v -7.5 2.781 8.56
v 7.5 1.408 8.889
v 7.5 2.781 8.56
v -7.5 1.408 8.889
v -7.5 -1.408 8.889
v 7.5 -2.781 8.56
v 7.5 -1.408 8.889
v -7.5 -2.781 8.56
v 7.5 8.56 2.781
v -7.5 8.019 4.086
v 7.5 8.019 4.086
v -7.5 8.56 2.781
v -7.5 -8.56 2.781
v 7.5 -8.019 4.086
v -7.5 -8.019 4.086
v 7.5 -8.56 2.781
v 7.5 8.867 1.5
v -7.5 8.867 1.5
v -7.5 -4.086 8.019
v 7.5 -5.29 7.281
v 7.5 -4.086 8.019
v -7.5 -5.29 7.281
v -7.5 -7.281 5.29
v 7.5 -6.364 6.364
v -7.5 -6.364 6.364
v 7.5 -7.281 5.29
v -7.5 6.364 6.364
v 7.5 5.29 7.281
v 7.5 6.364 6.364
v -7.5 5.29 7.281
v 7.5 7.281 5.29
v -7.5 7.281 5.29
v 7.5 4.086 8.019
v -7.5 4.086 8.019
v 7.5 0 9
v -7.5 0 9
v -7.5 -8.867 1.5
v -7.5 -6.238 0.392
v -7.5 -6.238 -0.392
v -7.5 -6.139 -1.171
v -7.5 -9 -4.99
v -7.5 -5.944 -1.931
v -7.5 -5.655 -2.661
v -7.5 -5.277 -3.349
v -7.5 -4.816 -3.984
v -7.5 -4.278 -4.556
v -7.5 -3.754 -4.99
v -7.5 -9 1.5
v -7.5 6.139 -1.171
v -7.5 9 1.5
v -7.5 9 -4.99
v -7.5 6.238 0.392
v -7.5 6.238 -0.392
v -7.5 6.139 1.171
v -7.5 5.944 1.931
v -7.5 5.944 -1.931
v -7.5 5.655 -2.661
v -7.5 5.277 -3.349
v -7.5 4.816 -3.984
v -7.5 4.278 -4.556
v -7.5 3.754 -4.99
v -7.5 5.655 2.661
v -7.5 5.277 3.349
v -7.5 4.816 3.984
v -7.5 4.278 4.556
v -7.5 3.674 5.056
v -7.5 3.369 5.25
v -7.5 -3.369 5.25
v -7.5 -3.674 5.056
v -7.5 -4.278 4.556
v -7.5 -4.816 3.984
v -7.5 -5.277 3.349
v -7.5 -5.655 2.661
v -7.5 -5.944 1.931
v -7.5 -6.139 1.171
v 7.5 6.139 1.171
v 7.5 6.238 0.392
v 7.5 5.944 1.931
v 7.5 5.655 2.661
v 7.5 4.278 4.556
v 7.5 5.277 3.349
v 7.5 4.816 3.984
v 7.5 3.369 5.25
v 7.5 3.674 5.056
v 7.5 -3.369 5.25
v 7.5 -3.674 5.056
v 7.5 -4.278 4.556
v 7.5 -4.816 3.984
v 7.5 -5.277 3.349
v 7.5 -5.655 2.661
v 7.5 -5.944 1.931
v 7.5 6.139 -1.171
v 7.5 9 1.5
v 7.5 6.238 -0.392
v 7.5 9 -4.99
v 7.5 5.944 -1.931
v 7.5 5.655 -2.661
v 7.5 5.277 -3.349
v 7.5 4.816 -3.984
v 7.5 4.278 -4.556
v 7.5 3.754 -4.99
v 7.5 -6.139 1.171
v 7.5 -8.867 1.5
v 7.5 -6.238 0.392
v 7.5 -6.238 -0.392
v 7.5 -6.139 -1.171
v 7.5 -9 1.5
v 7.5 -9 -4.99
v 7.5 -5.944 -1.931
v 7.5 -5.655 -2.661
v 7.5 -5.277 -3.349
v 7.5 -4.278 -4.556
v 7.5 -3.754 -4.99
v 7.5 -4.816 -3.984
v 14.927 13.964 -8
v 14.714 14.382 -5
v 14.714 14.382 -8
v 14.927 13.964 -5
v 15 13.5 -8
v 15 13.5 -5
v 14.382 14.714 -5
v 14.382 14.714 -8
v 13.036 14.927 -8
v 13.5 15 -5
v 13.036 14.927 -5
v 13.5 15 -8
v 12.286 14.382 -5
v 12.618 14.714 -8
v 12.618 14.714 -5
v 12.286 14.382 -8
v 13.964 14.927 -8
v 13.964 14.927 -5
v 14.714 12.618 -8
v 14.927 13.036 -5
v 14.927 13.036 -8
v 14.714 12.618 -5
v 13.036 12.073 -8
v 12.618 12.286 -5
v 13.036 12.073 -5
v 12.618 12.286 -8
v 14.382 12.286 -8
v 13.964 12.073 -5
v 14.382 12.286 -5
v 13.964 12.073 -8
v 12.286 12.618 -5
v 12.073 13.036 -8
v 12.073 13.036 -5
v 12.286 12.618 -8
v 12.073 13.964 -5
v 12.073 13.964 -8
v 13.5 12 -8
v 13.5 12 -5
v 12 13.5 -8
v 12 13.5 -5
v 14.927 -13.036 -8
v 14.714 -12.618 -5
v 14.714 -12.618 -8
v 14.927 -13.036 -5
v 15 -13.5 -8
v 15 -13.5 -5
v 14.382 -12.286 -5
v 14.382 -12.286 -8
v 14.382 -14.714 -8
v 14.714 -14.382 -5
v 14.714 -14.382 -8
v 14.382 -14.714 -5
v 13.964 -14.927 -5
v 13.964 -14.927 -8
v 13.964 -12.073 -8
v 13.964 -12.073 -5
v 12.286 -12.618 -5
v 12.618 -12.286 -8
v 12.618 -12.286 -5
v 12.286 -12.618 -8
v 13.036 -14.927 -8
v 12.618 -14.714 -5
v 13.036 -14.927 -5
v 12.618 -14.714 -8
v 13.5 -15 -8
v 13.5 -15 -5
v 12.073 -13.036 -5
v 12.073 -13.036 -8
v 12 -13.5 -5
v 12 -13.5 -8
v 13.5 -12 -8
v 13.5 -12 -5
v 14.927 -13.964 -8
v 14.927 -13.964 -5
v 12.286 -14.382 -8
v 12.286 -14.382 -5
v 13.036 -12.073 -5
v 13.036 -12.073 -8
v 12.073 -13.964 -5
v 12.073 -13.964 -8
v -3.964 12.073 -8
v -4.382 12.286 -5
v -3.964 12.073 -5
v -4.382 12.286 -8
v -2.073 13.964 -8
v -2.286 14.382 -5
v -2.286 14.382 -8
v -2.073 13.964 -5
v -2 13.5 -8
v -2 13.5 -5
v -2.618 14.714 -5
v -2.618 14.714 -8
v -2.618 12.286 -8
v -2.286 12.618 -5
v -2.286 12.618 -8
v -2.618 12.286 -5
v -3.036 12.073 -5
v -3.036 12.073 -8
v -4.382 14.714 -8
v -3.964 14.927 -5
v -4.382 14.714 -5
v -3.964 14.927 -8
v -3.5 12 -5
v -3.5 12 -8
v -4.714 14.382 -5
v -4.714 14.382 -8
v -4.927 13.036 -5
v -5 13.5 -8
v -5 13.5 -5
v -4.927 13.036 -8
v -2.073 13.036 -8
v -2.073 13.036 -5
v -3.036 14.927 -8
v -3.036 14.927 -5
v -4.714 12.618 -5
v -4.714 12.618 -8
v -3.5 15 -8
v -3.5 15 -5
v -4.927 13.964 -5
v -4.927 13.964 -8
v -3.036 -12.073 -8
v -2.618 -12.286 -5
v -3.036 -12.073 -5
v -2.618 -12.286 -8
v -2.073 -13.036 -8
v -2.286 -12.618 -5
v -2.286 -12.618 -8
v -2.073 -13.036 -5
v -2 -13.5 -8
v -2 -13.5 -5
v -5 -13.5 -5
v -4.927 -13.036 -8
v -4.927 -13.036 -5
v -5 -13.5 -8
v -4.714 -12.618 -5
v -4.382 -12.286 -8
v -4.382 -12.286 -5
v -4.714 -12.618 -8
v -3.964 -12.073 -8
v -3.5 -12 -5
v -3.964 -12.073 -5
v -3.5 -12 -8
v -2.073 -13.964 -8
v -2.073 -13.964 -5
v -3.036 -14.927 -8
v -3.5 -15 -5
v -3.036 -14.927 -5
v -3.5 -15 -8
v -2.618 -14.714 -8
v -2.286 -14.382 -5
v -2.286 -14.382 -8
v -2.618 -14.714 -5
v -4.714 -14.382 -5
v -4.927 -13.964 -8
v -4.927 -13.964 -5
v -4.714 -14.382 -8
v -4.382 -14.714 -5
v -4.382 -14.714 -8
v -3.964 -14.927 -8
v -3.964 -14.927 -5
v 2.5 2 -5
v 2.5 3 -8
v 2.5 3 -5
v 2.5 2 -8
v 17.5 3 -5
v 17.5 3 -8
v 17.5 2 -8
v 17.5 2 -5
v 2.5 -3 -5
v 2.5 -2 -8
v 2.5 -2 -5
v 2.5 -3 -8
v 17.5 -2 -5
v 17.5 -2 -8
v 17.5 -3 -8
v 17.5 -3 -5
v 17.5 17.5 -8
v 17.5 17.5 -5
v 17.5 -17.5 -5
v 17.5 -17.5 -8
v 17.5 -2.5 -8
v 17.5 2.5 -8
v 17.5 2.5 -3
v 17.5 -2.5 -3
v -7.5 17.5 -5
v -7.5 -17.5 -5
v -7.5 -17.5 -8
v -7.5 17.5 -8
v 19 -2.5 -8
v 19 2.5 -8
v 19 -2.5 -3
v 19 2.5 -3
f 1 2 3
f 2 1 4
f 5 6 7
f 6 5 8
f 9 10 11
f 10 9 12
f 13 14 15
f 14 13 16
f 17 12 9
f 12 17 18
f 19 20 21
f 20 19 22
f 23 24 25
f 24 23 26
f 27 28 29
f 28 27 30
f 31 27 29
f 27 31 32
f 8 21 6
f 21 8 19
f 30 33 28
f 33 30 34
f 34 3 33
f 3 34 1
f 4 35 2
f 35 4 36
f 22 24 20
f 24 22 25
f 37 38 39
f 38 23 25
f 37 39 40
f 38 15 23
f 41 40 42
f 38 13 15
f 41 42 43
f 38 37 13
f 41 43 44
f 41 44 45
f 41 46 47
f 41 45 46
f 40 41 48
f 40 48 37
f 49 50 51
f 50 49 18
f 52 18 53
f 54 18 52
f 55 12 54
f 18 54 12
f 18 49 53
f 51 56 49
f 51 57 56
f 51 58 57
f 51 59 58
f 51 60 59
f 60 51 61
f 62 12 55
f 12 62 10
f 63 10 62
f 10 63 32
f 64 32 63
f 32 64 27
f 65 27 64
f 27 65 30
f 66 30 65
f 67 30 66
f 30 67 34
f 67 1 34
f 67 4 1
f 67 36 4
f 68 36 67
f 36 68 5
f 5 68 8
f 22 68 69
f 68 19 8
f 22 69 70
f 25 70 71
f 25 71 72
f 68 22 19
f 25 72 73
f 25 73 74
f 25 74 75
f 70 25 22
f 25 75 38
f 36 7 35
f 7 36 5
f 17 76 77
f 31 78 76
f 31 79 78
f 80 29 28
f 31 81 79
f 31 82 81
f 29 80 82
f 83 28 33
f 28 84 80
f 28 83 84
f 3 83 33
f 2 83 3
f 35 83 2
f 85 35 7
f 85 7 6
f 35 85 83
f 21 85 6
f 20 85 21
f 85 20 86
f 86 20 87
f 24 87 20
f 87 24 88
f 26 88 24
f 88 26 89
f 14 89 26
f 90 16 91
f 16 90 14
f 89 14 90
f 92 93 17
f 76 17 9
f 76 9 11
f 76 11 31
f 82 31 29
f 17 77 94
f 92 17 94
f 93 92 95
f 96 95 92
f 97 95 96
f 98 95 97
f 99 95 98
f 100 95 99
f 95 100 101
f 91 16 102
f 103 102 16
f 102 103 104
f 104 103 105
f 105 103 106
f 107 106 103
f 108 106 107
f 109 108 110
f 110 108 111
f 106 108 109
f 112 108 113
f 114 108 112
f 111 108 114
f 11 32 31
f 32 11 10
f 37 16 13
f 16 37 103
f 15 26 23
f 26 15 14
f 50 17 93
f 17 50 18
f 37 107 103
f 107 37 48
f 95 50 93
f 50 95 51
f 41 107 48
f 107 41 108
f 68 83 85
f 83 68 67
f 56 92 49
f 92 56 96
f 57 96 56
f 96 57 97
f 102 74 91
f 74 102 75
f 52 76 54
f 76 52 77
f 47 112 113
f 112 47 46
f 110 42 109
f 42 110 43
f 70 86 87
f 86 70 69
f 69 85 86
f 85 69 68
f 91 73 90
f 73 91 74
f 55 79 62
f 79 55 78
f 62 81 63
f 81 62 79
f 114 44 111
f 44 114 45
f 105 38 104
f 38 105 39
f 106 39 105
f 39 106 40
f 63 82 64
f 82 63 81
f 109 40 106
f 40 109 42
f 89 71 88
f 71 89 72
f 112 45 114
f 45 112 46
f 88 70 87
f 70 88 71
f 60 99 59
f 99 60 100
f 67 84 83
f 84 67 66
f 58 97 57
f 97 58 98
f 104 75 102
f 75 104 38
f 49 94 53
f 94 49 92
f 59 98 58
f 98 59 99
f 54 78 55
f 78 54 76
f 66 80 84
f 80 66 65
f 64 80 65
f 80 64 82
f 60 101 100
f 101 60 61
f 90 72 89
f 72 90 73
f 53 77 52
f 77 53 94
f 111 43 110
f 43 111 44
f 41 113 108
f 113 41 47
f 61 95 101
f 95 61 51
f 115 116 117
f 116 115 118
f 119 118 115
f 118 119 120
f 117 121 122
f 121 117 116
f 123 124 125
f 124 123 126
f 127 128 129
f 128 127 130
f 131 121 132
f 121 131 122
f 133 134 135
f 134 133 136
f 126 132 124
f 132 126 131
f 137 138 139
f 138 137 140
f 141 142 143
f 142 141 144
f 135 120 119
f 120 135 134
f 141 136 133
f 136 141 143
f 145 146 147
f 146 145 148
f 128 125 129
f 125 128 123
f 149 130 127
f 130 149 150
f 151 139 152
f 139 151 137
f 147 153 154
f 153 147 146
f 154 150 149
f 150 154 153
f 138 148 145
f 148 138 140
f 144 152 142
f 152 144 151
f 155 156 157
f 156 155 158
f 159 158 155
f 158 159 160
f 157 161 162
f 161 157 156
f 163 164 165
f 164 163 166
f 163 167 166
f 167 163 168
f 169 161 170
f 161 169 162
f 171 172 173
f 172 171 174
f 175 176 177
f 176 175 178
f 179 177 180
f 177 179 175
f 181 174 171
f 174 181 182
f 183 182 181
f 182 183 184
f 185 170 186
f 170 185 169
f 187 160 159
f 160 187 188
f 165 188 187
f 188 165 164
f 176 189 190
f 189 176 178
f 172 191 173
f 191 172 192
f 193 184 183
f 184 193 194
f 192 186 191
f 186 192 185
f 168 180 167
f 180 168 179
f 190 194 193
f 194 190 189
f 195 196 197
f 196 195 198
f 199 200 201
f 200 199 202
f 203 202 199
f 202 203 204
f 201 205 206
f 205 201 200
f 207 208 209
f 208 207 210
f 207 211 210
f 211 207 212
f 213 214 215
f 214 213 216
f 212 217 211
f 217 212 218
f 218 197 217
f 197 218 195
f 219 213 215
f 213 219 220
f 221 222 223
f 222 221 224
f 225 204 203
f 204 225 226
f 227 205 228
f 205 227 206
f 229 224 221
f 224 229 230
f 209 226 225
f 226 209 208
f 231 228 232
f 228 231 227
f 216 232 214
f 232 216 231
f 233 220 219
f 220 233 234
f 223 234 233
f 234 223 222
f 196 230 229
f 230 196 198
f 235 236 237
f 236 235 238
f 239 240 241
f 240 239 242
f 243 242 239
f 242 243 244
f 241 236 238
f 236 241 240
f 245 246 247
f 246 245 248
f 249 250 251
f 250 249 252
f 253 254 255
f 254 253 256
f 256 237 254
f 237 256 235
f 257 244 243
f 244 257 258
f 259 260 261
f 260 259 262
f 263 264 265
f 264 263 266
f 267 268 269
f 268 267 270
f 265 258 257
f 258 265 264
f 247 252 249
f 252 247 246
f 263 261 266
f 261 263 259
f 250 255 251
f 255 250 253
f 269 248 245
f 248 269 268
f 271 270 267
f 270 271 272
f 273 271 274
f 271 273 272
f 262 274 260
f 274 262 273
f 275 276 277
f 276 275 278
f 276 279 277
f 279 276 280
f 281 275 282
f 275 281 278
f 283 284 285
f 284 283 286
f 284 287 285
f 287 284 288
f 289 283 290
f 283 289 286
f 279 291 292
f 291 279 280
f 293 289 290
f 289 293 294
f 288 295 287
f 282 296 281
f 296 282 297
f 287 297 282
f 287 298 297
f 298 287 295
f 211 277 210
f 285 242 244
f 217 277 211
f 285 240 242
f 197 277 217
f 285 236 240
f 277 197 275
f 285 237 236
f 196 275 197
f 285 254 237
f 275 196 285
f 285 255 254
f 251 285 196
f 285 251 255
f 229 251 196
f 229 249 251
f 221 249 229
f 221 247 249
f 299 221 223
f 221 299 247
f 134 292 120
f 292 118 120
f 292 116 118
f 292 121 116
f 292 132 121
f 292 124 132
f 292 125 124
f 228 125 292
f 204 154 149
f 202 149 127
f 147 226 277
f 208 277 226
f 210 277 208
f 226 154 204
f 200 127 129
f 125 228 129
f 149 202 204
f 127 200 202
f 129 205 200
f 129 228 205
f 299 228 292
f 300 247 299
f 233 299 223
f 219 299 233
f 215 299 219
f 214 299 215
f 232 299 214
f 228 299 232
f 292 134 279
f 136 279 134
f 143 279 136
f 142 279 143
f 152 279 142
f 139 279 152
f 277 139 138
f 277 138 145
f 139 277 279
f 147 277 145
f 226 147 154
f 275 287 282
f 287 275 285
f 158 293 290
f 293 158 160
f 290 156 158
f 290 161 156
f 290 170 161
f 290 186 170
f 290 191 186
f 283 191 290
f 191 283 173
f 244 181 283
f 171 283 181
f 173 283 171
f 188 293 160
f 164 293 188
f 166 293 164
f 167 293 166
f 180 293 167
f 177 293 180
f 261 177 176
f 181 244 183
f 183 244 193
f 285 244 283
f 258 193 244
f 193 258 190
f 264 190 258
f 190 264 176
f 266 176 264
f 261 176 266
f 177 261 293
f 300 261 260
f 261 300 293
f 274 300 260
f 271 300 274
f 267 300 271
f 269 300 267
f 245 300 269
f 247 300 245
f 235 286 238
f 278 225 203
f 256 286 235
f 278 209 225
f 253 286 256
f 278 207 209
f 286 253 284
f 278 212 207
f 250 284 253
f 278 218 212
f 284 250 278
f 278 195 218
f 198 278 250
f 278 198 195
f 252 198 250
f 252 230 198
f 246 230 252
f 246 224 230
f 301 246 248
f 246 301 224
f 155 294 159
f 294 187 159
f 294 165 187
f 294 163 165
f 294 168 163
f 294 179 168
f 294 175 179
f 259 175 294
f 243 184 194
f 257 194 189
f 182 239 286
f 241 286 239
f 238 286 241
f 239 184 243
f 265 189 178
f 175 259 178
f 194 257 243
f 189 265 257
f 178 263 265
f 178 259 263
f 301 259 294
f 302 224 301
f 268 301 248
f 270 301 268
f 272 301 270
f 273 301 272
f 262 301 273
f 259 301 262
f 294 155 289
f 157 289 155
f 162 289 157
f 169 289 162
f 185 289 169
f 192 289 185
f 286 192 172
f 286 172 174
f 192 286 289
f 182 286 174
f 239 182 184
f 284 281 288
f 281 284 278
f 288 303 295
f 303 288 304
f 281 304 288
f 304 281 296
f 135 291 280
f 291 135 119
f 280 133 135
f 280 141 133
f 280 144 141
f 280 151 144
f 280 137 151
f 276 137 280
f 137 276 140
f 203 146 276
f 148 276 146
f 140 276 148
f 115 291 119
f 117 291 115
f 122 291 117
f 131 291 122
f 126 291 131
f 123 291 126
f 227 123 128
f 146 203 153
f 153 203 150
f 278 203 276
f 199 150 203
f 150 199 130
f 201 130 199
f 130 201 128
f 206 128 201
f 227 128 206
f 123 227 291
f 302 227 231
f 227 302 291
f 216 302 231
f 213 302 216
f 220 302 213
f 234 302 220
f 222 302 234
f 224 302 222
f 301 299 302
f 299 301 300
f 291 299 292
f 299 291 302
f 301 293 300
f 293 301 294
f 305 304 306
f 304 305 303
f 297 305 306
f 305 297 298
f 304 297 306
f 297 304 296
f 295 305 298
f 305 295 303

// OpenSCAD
//===============================
//
//  No-tools micro motor mounts
//
//  Designed by Andrew Moore, May 2016
//      http://www.thingiverse.com/TacPar
//
//      For questions, suggestions, or whatever, 
//      please PM me through thingiverse.
//
//      This work is licensed under a Creative Commons 
//      Attribution-ShareAlike 4.0 International License.
//      http://creativecommons.org/licenses/by-sa/4.0/
//
//  This can be used with a variety of 12mm micro gear motors
//  Length dimensions may need to change to accomodate 
//  different gear ratios (particularly the Pololu 
//  1000:1 motors)
//
//  This design allows for a little slop in motor 
//  position.  You can always tighten that up with 
//  some shim stock after you insert the motor.
//
//  The mounting holes are arbitrarily set based on the plate dimensions
//  This could be improved.
//
//  If you use an encoder, you may have to solder it to the back of the 
//  motor after inserting the motor into the holder.
//===============================

//this is motor length without the gearbox
motor_length = 15;
//dimension for rounded sides on micro motor
motor_width = 12; 	
//flat sides on micro motor
motor_height = 10;
//length of the gear box not including the output shaft
gearbox_length = 10;

//wall thickness for the motor holder before tolerance losses
housing_thickness = 3;

//this defines how oversized the hole is for the motor
//this will reduce the effective housing thickness above
tolerance = 0.25;

plate_thickness = 3;
plate_width = 35;
plate_length = motor_length+gearbox_length;
tab_height = plate_thickness+2;
tab_width = 5;
tab_thickness = 1.5;

module MicroGearMotorMount()
{
	//backplate()
	difference()
	{
		positives();
		negatives();
	}
	//add ons in areas that were erased...
	
	//back plate
	translate([plate_length/2-motor_length/2,0,-(motor_height/2+plate_thickness/2)]) backplate();
	//gearbox tab ... stops motor from sliding forward
	translate([-motor_length/2+plate_length+tab_thickness/2,0,-motor_height+tab_height-.5]) cube([tab_thickness,tab_width,tab_height], center=true);

	module positives()
	{
		//motor holding ring
		rotate([0,90,0]) 
            translate([0,0,0]) 
            cylinder(r=motor_width/2+housing_thickness, h=motor_length, center=true, $fn=40);

		translate([0,0,-motor_height/2+plate_thickness]) 
            cube([motor_length,motor_width+2*housing_thickness,motor_height-plate_thickness], center=true);
	}

	module negatives()
	{
		//cut off cylinder below the mounting plate
		translate([0,0,-(motor_height/2+plate_thickness-0.01)]) 
            cube([100,100,2*plate_thickness], center=true);

		//keyed shaft
		rotate([0,90,0]) 
        translate([0,0,-motor_length/2-0.1]) keyshaft(); 
        //translate([0,0,-motor_height/4]) cube([motor_length+.1,motor_width+1,motor_height/2], center=true);
		
	}
    module keyshaft()
    {
        difference()
		{
			positives();
            negatives();
            
			
		}
        module positives()
        {
            cylinder(r=motor_width/2+tolerance, h=motor_length+1, $fn=50);
        }
        
        module negatives()
        {
            translate([-motor_height-tolerance,0,motor_length/2+tolerance]) cube([motor_height,motor_width,motor_length+2],center=true);
            translate([motor_height+tolerance,0,motor_length/2+tolerance]) cube([motor_height,motor_width,motor_length+2],center=true);
        }
    }
	module backplate()
	{
		difference()
		{
			positives();
			negatives();
		}
        
        module positives()
        {
            cube([plate_length,plate_width,plate_thickness],center=true);
        }
        module negatives()
        {
            mount_holes();
			tab_slots();
        }
        
		module mount_holes()
		{
			rotate([0,0,0]) 
                translate([plate_length/2-4,plate_width/2-4,0]) 
                cylinder(r=1.5, h=plate_thickness+1, $fn=20, center=true);
			rotate([0,0,0])
                translate([plate_length/2-4,-(plate_width/2-4),0]) 
                cylinder(r=1.5, h=plate_thickness+1, $fn=20, center=true);
			rotate([0,0,0])
                translate([-(plate_length/2-4),plate_width/2-4,0]) 
                cylinder(r=1.5, h=plate_thickness+1, $fn=20, center=true);
			rotate([0,0,0])
                translate([-(plate_length/2-4),-(plate_width/2-4),0]) 
                cylinder(r=1.5, h=plate_thickness+1, $fn=20, center=true);
			
		}
		module tab_slots()
		{
			translate([0.4*plate_length,tab_width/2, 0]) cube([plate_length,1,plate_thickness+1], center=true);
			translate([0.4*plate_length,-tab_width/2, 0]) cube([plate_length,1,plate_thickness+1], center=true);
		}
	}

	
}

MicroGearMotorMount();
